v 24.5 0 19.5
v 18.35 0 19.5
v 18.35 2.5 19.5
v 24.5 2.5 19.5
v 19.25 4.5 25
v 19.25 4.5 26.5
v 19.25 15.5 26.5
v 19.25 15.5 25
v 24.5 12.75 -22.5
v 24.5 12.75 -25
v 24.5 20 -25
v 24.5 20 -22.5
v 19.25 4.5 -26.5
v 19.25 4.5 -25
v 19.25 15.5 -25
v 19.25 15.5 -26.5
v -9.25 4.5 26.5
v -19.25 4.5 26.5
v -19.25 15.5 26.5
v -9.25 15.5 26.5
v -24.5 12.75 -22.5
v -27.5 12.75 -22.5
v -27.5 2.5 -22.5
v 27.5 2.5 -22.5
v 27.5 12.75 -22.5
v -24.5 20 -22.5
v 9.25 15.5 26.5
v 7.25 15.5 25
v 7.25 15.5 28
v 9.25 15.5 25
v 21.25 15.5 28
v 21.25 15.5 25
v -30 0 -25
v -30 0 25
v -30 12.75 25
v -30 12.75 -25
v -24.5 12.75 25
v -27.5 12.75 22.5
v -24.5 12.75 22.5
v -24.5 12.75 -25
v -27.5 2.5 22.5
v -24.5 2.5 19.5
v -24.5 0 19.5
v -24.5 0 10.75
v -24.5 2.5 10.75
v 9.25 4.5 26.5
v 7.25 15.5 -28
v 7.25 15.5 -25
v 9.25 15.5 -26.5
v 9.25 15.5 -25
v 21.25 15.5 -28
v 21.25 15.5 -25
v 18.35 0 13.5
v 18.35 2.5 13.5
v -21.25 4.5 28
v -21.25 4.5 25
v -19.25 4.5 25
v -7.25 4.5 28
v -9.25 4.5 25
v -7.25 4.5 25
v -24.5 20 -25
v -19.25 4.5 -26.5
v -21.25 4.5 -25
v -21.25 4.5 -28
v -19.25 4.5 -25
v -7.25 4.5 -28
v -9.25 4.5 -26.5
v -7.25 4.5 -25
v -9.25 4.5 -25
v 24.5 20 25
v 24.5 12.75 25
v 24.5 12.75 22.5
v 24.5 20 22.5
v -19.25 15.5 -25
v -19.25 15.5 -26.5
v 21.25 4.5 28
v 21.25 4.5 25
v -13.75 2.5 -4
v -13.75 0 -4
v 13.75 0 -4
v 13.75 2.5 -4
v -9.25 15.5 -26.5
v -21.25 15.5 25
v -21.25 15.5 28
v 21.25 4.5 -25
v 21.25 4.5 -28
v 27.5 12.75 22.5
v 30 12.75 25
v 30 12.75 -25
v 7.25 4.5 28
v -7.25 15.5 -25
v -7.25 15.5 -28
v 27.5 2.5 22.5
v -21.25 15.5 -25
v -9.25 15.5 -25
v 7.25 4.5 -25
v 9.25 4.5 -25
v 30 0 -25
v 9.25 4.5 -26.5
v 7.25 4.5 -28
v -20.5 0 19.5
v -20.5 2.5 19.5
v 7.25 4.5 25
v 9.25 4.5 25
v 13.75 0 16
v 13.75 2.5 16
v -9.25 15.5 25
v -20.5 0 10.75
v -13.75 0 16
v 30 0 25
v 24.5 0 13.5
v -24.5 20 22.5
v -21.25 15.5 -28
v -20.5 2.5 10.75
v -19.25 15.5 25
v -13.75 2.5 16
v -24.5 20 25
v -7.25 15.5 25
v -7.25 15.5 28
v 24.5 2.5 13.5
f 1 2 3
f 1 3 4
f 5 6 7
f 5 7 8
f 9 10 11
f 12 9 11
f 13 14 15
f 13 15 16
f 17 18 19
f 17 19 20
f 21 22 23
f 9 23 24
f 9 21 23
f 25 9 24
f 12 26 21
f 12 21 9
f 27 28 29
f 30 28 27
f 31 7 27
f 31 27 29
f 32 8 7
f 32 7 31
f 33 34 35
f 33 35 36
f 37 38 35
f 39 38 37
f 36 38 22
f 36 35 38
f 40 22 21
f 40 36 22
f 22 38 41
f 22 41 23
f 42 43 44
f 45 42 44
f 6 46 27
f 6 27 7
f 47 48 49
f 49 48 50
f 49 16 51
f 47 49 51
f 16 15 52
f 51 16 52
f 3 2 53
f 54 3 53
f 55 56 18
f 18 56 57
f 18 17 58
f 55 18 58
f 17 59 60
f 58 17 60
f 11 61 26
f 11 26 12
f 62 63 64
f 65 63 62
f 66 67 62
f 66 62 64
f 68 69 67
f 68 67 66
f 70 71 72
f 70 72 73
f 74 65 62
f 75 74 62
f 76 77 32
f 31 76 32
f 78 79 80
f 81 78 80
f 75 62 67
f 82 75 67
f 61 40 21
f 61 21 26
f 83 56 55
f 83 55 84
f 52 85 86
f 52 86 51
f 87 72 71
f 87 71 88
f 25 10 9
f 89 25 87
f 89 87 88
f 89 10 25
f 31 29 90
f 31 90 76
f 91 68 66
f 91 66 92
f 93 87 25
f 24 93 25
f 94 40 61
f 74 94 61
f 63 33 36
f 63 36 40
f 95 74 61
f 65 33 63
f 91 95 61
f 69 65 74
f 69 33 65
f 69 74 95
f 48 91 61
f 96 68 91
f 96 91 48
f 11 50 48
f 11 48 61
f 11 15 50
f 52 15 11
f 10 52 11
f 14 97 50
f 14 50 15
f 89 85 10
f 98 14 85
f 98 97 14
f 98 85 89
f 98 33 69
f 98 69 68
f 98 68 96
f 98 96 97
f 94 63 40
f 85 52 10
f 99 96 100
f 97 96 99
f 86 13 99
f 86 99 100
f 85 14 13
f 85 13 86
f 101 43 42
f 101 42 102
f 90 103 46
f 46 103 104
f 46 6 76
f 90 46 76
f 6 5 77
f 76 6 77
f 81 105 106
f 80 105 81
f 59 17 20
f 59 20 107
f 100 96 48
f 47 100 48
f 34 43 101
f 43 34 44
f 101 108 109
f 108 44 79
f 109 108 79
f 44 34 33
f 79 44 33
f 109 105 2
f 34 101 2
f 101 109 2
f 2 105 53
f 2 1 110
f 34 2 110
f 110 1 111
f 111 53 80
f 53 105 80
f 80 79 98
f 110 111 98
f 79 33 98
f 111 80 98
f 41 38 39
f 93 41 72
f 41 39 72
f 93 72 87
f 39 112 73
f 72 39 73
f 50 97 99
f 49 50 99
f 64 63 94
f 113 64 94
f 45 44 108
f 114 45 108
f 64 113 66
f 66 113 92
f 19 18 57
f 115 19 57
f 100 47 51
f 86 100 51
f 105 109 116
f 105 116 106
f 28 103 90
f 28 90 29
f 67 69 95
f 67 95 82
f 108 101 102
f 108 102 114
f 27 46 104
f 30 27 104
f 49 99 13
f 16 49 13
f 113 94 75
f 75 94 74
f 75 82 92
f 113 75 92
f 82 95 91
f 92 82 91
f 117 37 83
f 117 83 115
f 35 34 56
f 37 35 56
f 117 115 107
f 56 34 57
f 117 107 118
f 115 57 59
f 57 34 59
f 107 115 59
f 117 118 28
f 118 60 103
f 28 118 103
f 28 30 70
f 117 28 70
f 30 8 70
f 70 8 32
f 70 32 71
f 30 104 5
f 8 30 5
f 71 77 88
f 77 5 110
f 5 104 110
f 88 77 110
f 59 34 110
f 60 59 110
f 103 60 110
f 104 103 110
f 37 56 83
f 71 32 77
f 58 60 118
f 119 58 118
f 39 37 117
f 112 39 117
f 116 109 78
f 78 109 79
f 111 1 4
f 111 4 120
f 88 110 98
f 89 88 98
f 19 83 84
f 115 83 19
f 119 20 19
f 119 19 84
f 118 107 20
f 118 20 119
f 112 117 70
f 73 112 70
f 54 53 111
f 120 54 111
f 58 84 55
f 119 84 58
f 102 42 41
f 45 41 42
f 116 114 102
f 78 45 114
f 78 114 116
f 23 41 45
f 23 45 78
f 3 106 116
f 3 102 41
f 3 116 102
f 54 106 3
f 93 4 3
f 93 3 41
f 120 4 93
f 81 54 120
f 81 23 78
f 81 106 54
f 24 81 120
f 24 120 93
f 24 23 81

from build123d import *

# Parameters (mm, degrees)
CROQUIS1_W              = 60
CROQUIS1_H              = 50
SALIENTE_EXTRUIR1_DEPTH = 12.75
CORTAR_EXTRUIR2_START   = 12.75
CROQUIS2_W              = 55
CROQUIS2_H              = 45
CORTAR_EXTRUIR2_DEPTH   = 10.25
SALIENTE_EXTRUIR2_START = 25
CROQUIS4_W              = 49
CROQUIS4_H              = 7.25
SALIENTE_EXTRUIR2_DEPTH = 2.5
SALIENTE_EXTRUIR3_START = -25
CROQUIS4_2_W            = 49
CROQUIS4_2_H            = 7.25
SALIENTE_EXTRUIR3_DEPTH = 2.5
CROQUIS5_W              = 27.5
CROQUIS5_H              = 20
CORTAR_EXTRUIR3_DEPTH   = 10
SALIENTE_EXTRUIR5_START = 25
CROQUIS6_W              = 14
CROQUIS6_H              = 11
SALIENTE_EXTRUIR5_DEPTH = 3
SALIENTE_EXTRUIR6_START = -25
CROQUIS6_2_W            = 14
CROQUIS6_2_H            = 11
SALIENTE_EXTRUIR6_DEPTH = 3
CROQUIS8_W              = 10
CROQUIS8_H              = 1.5
CORTAR_EXTRUIR5_DEPTH   = 43.5
CROQUIS9_W              = 4
CROQUIS9_H              = 8.75
CROQUIS9_W_2            = 6.15
CROQUIS9_H_2            = 6
CORTAR_EXTRUIR6_DEPTH   = 43.5


with BuildPart() as part:
    # Croquis1 → Saliente-Extruir1 (new body)
    with BuildSketch(Plane(origin=(0, 0, 0), x_dir=(1, 0, 0), z_dir=(0, 1, 0))):
        Rectangle(CROQUIS1_W, CROQUIS1_H)
    extrude(amount=SALIENTE_EXTRUIR1_DEPTH)

    # Croquis2 → Cortar-Extruir2 (cut)
    with BuildSketch(Plane(origin=(0, 0, 0), x_dir=(1, 0, 0), z_dir=(0, 1, 0)).offset(CORTAR_EXTRUIR2_START)):
        Rectangle(CROQUIS2_W, CROQUIS2_H)
    extrude(amount=-CORTAR_EXTRUIR2_DEPTH, mode=Mode.SUBTRACT)

    # Croquis4 → Saliente-Extruir2 (add)
    with BuildSketch(Plane.XY.offset(SALIENTE_EXTRUIR2_START)):
        with Locations((0, 16.375)):
            Rectangle(CROQUIS4_W, CROQUIS4_H)
    extrude(amount=-SALIENTE_EXTRUIR2_DEPTH)

    # Croquis4<2> → Saliente-Extruir3 (add)
    with BuildSketch(Plane.XY.offset(SALIENTE_EXTRUIR3_START)):
        with Locations((0, 16.375)):
            Rectangle(CROQUIS4_2_W, CROQUIS4_2_H)
    extrude(amount=SALIENTE_EXTRUIR3_DEPTH)

    # Croquis5 → Cortar-Extruir3 (cut)
    with BuildSketch(Plane(origin=(0, 0, 0), x_dir=(1, 0, 0), z_dir=(0, 1, 0))):
        with Locations((0, -6)):
            Rectangle(CROQUIS5_W, CROQUIS5_H)
    extrude(amount=CORTAR_EXTRUIR3_DEPTH, mode=Mode.SUBTRACT)

    # Croquis6 → Saliente-Extruir5 (add)
    with BuildSketch(Plane.XY.offset(SALIENTE_EXTRUIR5_START)):
        with Locations((-14.25, 10)):
            Rectangle(CROQUIS6_W, CROQUIS6_H)
        with Locations((14.25, 10)):
            Rectangle(CROQUIS6_W, CROQUIS6_H)
    extrude(amount=SALIENTE_EXTRUIR5_DEPTH)

    # Croquis6<2> → Saliente-Extruir6 (add)
    with BuildSketch(Plane.XY.offset(SALIENTE_EXTRUIR6_START)):
        with Locations((-14.25, 10)):
            Rectangle(CROQUIS6_2_W, CROQUIS6_2_H)
        with Locations((14.25, 10)):
            Rectangle(CROQUIS6_2_W, CROQUIS6_2_H)
    extrude(amount=-SALIENTE_EXTRUIR6_DEPTH)

    # Croquis8 → Cortar-Extruir5 (cut)
    with BuildSketch(Plane(origin=(0, 0, 0), x_dir=(1, 0, 0), z_dir=(0, 1, 0))):
        with Locations((-14.25, 25.75)):
            Rectangle(CROQUIS8_W, CROQUIS8_H)
        with Locations((14.25, 25.75)):
            Rectangle(CROQUIS8_W, CROQUIS8_H)
        with Locations((14.25, -25.75)):
            Rectangle(CROQUIS8_W, CROQUIS8_H)
        with Locations((-14.25, -25.75)):
            Rectangle(CROQUIS8_W, CROQUIS8_H)
    extrude(amount=CORTAR_EXTRUIR5_DEPTH, mode=Mode.SUBTRACT)

    # Croquis9 → Cortar-Extruir6 (cut)
    with BuildSketch(Plane(origin=(0, 0, 0), x_dir=(1, 0, 0), z_dir=(0, 1, 0))):
        with Locations((-22.5, -15.125)):
            Rectangle(CROQUIS9_W, CROQUIS9_H)
        with Locations((21.425, -16.5)):
            Rectangle(CROQUIS9_W_2, CROQUIS9_H_2)
    extrude(amount=CORTAR_EXTRUIR6_DEPTH, mode=Mode.SUBTRACT)


solid = part.part
